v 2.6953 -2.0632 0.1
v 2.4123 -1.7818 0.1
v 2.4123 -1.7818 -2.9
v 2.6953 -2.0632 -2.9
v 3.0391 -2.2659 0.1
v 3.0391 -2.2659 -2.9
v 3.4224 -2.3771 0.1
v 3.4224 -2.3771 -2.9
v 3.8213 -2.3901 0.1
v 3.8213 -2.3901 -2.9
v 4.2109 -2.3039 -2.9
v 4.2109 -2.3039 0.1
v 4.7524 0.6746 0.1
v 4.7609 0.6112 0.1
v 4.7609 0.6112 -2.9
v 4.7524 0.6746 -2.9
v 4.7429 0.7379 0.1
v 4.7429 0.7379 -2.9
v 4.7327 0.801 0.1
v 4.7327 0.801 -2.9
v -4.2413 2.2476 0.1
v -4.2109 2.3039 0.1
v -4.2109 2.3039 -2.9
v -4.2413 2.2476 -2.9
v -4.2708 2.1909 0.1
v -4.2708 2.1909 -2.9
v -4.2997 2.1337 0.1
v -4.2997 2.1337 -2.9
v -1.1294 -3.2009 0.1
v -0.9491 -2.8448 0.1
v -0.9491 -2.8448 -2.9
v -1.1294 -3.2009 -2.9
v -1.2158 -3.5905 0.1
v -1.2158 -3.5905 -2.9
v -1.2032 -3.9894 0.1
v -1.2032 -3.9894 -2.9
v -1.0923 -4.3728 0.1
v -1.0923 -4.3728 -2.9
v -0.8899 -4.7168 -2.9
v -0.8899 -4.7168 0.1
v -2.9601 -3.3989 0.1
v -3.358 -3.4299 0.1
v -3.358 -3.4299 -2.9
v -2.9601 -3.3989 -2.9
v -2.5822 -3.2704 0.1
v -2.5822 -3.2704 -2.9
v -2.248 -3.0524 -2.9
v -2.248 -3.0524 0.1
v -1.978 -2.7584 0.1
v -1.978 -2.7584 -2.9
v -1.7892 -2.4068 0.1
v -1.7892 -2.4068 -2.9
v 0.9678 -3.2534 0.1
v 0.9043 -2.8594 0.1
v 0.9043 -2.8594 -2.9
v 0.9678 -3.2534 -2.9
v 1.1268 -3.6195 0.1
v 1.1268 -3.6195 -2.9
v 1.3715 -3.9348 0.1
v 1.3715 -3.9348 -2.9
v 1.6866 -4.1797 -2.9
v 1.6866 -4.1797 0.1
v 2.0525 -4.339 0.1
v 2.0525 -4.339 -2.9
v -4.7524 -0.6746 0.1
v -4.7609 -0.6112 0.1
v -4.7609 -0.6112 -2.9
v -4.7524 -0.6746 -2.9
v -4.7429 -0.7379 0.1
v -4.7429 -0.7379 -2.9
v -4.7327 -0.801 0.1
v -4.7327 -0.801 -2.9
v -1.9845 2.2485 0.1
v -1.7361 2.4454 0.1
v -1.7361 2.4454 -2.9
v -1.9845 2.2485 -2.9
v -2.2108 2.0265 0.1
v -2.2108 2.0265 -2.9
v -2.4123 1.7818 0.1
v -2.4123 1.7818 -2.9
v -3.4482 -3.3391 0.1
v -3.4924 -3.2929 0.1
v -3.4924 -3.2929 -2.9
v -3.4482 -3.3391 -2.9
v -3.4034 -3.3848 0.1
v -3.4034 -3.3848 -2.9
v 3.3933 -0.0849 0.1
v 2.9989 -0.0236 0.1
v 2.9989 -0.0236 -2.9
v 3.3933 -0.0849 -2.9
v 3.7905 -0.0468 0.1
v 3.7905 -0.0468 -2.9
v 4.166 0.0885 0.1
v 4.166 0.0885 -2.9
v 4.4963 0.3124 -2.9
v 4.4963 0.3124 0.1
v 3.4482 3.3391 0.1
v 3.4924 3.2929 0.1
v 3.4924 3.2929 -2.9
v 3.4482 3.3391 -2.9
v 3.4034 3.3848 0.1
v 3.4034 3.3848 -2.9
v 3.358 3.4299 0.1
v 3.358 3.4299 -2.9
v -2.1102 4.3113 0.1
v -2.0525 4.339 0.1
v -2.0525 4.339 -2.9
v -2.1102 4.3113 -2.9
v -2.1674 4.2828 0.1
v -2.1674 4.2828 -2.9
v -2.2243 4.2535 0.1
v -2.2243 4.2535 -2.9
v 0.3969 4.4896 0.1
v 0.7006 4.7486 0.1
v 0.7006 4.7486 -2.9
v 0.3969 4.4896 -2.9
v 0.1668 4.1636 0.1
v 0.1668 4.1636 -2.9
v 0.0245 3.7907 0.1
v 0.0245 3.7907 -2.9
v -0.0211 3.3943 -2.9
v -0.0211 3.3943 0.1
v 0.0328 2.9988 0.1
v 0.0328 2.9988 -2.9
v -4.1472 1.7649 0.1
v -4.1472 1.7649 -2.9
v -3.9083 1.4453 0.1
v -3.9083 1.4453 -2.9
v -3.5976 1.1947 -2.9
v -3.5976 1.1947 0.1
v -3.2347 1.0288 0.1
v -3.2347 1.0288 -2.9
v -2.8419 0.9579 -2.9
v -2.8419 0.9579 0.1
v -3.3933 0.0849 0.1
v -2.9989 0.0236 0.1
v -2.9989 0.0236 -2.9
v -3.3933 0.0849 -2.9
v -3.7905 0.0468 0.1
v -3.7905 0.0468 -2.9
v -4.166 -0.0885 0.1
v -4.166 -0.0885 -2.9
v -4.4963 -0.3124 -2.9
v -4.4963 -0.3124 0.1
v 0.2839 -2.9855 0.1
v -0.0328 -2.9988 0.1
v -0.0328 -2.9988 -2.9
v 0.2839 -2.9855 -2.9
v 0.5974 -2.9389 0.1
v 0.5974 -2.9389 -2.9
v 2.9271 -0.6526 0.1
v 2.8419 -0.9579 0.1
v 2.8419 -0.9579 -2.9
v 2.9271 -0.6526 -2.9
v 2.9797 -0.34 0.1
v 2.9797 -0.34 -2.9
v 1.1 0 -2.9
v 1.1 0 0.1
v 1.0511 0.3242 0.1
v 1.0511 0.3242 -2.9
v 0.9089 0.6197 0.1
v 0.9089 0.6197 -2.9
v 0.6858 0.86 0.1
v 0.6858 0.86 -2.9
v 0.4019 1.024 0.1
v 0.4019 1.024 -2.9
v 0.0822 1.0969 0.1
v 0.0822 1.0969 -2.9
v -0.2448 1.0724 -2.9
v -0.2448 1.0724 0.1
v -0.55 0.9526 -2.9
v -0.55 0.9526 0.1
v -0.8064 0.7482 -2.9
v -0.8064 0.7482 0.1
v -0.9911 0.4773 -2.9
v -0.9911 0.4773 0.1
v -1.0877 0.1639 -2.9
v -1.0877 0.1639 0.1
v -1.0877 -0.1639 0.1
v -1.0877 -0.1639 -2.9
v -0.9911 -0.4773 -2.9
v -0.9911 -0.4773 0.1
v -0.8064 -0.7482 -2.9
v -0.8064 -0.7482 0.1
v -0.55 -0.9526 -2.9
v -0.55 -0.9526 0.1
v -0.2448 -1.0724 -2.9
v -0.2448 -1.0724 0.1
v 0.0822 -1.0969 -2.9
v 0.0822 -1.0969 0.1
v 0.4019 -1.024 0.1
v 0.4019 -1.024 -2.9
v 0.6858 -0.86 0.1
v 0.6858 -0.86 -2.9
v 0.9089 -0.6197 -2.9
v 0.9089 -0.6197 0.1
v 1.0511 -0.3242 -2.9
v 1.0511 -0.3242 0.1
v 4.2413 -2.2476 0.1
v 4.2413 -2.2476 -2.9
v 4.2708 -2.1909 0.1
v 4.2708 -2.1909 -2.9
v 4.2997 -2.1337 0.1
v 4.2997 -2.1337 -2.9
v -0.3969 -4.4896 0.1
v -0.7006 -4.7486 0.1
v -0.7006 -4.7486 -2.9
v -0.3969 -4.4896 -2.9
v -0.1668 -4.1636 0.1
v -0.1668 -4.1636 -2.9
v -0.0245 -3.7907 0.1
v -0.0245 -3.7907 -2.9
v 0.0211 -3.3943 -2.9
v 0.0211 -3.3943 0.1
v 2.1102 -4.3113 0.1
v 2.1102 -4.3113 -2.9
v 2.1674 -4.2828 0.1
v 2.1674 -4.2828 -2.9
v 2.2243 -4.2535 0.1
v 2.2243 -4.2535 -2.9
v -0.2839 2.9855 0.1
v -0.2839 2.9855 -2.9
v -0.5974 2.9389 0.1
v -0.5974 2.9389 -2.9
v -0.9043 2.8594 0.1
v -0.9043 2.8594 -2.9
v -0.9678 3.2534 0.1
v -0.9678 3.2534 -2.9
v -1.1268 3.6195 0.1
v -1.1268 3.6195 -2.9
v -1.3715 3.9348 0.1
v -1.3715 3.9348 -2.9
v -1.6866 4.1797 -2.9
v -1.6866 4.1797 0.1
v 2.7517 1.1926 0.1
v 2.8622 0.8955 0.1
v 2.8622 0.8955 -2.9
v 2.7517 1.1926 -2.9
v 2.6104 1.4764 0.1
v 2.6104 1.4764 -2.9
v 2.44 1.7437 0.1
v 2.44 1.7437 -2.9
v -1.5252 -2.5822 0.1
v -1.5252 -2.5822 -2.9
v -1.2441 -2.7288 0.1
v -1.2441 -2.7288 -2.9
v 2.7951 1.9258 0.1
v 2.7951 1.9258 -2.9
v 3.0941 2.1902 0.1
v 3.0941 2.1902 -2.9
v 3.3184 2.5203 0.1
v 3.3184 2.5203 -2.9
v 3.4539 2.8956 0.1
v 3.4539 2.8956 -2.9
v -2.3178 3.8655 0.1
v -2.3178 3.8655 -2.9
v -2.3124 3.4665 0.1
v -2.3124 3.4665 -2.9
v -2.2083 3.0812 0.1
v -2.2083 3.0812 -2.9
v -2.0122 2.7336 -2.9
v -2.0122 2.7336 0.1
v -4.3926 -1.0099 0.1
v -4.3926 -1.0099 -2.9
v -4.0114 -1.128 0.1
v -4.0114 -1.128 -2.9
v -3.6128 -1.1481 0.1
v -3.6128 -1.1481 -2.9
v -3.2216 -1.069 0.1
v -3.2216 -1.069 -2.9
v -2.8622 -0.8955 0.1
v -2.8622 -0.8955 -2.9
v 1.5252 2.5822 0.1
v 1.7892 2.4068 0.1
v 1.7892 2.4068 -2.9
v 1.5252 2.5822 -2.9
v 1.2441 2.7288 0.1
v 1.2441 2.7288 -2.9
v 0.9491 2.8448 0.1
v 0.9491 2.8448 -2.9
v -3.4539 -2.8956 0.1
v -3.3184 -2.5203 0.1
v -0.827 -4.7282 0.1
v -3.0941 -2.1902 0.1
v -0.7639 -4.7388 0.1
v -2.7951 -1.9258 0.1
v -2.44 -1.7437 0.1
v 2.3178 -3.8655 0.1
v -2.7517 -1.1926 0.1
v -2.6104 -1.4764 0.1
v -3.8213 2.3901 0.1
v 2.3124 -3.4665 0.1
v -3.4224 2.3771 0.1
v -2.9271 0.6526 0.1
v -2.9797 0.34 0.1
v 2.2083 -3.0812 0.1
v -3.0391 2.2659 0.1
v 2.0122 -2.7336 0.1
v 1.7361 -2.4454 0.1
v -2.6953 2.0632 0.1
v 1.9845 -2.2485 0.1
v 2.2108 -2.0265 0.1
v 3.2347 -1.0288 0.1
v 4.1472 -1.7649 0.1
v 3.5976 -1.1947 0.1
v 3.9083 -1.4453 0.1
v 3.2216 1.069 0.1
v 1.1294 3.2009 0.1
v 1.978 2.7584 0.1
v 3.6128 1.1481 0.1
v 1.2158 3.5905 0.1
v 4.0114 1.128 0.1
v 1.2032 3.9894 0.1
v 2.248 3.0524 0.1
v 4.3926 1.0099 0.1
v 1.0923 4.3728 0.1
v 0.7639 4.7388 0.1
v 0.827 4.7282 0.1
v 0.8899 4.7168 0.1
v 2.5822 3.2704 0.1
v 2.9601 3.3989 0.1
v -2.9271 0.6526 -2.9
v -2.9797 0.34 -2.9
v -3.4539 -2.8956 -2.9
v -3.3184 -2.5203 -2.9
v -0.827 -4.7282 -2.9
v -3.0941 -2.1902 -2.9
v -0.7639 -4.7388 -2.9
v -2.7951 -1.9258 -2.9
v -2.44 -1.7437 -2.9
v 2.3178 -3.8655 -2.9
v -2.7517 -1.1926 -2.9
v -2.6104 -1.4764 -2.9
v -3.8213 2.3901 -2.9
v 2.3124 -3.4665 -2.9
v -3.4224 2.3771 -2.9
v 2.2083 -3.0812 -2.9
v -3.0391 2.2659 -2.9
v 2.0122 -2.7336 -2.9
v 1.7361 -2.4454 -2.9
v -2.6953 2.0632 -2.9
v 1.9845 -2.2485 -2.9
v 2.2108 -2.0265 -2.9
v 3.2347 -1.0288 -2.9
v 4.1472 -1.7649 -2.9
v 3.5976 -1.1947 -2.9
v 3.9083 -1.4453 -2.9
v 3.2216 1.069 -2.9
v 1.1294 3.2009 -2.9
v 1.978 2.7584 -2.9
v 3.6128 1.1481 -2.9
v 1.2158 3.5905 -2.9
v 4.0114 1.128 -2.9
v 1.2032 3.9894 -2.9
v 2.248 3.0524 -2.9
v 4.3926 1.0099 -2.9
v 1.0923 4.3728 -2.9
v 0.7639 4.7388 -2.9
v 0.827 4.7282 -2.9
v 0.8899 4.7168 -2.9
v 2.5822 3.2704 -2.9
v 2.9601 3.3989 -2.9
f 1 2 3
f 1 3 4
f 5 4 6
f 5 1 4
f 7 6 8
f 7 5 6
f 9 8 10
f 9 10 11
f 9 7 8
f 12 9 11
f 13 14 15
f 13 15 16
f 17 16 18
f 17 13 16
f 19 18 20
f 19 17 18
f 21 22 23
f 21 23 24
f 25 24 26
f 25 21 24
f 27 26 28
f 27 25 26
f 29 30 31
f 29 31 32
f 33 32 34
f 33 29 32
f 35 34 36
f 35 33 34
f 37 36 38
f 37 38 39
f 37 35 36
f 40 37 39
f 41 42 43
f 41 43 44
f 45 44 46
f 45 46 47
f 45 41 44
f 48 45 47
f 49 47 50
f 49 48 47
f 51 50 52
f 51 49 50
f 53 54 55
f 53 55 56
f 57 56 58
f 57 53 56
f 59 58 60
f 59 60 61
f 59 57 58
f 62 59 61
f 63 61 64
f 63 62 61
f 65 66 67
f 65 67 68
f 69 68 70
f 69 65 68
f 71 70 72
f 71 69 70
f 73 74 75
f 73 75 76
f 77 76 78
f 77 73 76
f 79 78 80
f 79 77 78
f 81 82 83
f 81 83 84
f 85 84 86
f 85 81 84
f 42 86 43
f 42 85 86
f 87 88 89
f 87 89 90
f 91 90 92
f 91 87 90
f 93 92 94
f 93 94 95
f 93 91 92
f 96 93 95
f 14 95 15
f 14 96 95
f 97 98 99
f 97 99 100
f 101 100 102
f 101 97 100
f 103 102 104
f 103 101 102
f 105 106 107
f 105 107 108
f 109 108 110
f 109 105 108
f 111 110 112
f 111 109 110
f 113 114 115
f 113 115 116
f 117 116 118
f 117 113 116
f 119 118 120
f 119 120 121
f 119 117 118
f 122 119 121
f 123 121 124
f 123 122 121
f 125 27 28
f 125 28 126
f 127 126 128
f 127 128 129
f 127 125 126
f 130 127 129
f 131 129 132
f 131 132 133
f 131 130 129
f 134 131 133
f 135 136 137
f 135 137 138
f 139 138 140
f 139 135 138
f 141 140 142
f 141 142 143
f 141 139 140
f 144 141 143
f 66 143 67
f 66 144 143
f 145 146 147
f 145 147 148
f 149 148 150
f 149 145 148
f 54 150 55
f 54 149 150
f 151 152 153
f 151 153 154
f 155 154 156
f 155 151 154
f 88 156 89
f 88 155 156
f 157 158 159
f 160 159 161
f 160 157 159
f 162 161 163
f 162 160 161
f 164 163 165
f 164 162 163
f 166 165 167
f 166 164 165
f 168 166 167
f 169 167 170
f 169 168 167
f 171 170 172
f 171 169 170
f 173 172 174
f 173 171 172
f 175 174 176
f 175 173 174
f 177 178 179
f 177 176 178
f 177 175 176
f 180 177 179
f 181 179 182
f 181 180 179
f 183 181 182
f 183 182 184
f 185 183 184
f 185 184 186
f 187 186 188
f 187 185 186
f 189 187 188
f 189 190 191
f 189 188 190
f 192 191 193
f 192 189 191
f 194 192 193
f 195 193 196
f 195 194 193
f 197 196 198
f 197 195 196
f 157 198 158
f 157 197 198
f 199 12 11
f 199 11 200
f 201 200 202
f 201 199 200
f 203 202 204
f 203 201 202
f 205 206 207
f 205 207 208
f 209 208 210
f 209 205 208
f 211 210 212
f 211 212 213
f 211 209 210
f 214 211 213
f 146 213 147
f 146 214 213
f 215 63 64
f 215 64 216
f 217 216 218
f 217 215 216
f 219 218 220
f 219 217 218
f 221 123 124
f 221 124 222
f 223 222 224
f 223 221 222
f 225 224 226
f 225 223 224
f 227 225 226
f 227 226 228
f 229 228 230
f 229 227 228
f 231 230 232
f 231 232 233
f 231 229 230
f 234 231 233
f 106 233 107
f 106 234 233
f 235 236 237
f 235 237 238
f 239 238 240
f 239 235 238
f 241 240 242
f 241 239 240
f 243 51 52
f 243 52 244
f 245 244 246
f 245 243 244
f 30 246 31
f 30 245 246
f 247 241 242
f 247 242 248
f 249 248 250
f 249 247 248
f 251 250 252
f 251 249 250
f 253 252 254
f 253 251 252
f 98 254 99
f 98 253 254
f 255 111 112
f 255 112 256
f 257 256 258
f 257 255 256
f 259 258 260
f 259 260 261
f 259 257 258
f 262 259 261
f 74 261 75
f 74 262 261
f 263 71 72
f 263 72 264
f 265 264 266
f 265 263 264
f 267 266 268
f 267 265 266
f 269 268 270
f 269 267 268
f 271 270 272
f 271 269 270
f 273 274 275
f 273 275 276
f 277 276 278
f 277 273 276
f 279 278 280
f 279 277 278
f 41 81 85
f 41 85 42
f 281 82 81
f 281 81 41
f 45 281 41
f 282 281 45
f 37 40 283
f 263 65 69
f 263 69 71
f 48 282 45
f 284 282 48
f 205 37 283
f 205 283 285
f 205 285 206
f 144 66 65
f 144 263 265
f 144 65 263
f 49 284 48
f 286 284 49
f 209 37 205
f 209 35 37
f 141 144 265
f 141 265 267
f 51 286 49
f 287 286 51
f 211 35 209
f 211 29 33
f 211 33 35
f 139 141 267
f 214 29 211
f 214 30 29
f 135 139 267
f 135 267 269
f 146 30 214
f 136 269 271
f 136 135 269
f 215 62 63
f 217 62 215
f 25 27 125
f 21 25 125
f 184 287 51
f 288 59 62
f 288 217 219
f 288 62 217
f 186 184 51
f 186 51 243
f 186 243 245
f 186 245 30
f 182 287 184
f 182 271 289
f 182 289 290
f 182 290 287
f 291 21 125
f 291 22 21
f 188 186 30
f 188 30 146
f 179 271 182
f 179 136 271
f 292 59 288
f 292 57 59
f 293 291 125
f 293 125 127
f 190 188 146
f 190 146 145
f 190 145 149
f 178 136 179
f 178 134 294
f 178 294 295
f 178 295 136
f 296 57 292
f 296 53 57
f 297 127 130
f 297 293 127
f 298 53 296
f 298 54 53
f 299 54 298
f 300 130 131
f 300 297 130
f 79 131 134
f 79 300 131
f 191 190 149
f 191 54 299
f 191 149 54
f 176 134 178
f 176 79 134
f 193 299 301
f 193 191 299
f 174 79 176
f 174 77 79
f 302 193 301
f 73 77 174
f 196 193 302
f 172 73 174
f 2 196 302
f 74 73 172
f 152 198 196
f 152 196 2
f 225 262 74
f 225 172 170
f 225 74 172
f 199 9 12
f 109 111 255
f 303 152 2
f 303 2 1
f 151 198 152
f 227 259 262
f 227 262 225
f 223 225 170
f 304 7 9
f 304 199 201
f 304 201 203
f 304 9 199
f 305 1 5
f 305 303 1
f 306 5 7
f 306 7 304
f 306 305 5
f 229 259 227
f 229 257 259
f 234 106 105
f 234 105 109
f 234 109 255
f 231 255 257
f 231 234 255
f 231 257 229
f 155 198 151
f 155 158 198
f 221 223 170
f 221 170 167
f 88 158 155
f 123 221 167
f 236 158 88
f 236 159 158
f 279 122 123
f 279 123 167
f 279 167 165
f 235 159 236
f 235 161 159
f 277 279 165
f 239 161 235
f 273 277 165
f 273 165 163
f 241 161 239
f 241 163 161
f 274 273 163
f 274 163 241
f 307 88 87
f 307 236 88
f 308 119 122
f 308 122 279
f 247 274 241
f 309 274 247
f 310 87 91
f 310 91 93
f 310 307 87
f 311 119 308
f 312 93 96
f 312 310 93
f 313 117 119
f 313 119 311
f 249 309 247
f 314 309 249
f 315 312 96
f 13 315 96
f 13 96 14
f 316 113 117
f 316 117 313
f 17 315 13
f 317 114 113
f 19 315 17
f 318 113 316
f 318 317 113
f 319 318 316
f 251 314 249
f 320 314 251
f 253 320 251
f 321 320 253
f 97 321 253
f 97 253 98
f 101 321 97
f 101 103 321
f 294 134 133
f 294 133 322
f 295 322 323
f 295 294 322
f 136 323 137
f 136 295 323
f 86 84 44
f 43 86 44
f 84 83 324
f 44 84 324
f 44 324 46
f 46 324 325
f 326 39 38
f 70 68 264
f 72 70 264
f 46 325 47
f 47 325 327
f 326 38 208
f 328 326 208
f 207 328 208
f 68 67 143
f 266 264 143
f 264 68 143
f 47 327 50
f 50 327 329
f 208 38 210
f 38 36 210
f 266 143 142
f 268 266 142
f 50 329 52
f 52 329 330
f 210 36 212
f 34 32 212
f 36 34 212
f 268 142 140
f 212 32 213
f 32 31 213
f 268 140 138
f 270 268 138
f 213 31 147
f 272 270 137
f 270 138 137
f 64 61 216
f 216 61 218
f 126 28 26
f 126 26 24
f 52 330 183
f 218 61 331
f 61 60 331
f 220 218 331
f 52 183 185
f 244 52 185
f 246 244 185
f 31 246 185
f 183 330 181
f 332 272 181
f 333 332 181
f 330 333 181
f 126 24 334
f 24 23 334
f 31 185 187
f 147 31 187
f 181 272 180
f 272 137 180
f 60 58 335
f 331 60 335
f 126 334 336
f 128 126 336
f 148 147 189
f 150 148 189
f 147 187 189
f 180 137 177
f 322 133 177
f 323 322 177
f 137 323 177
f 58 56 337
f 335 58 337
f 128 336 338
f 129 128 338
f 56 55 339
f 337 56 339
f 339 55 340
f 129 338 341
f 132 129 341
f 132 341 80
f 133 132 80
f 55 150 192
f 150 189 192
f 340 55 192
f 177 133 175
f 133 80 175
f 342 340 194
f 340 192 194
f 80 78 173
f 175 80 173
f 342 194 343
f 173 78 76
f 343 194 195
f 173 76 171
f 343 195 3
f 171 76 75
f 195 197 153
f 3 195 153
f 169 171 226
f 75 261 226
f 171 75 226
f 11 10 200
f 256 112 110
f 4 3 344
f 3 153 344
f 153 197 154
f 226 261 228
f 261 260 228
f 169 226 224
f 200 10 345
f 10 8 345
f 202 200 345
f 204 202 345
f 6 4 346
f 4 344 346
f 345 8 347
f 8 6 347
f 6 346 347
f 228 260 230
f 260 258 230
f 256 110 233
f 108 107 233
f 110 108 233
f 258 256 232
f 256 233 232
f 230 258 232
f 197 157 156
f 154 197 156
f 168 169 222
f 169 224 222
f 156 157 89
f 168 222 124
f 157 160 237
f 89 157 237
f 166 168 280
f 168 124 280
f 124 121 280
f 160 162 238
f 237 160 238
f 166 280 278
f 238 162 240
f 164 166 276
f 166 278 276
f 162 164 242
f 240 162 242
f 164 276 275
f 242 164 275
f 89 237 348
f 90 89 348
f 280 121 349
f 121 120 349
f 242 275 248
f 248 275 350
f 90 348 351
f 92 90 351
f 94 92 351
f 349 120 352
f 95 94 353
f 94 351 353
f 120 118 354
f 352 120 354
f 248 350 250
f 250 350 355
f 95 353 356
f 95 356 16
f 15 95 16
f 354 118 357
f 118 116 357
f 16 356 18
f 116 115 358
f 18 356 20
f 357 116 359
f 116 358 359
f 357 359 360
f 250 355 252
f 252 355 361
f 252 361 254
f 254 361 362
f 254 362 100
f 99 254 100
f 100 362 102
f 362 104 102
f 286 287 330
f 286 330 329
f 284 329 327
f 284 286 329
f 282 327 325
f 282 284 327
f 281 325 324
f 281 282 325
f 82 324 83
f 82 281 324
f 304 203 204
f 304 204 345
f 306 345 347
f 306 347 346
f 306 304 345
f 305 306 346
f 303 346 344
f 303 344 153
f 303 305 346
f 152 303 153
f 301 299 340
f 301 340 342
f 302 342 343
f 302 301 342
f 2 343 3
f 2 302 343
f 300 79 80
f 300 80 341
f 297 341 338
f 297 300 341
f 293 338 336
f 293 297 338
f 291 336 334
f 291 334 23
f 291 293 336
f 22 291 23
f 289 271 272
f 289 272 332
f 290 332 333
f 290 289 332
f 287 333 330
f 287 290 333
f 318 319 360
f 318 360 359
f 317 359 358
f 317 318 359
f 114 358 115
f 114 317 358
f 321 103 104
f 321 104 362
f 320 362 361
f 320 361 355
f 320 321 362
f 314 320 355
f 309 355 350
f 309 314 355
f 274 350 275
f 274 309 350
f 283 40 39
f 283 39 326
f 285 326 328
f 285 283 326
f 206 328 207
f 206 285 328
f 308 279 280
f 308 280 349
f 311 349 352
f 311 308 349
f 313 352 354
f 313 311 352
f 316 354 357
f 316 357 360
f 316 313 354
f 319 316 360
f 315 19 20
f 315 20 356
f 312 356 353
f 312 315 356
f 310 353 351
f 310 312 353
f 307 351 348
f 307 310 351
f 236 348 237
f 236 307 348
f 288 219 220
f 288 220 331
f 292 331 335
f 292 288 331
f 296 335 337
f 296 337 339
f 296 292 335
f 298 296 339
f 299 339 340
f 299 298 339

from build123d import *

# Parameters (mm, degrees)
SKETCH1_R           = 6
SKETCH1_R_2         = 1.1
BOSS_EXTRUDE1_DEPTH = 2.9
SKETCH2_R           = 6
CUT_EXTRUDE1_DEPTH  = 11.278132126
CUT_EXTRUDE2_DEPTH  = 2.8


with BuildPart() as part:
    # Sketch1 → Boss-Extrude1 (new, symmetric)
    with BuildSketch(Plane.XY):
        Circle(SKETCH1_R)
        Circle(SKETCH1_R_2, mode=Mode.SUBTRACT)
    extrude(amount=BOSS_EXTRUDE1_DEPTH, both=True)

    # Sketch2 → Cut-Extrude1 (cut, through all)
    with BuildSketch(Plane.XY.offset(2.9)):
        Circle(SKETCH2_R)
        with BuildLine():
            ThreePointArc((-0.904303163, 2.859411966), (-1.23929318, 3.784776039), (-2.052505646, 4.339034521))
            ThreePointArc((-2.052505646, 4.339034521), (-2.138842368, 4.297133152), (-2.224324134, 4.253514094))
            ThreePointArc((-2.224324134, 4.253514094), (-2.272407373, 3.270556831), (-1.736096974, 2.44539737))
            ThreePointArc((-1.736096974, 2.44539737), (-2.100579038, 2.140459929), (-2.412316811, 1.781776811))
            ThreePointArc((-2.412316811, 1.781776811), (-3.227244783, 2.333509881), (-4.210932449, 2.303920118))
            ThreePointArc((-4.210932449, 2.303920118), (-4.256151318, 2.219273746), (-4.29966888, 2.133740266))
            ThreePointArc((-4.29966888, 2.133740266), (-3.760801254, 1.310248516), (-2.841900466, 0.957915832))
            ThreePointArc((-2.841900466, 0.957915832), (-2.957534919, 0.496979078), (-2.998907428, 0.023563475))
            ThreePointArc((-2.998907428, 0.023563475), (-3.982498568, -0.009077739), (-4.760926181, -0.611213463))
            ThreePointArc((-4.760926181, -0.611213463), (-4.747755125, -0.706272801), (-4.732686255, -0.801049821))
            ThreePointArc((-4.732686255, -0.801049821), (-3.812696882, -1.150530198), (-2.862194572, -0.895456995))
            ThreePointArc((-2.862194572, -0.895456995), (-2.684812984, -1.336330888), (-2.440017337, -1.743650307))
            ThreePointArc((-2.440017337, -1.743650307), (-3.216573261, -2.348197971), (-3.49240793, -3.292884275))
            ThreePointArc((-3.49240793, -3.292884275), (-3.425877845, -3.362047143), (-3.357978338, -3.429866103))
            ThreePointArc((-3.357978338, -3.429866103), (-2.408271889, -3.171845481), (-1.789227635, -2.406795685))
            ThreePointArc((-1.789227635, -2.406795685), (-1.386583742, -2.659207876), (-0.949123556, -2.844848937))
            ThreePointArc((-0.949123556, -2.844848937), (-1.222026295, -3.79038639), (-0.889908552, -4.716785215))
            ThreePointArc((-0.889908552, -4.716785215), (-0.795431669, -4.733633748), (-0.700636829, -4.74859011))
            ThreePointArc((-0.700636829, -4.74859011), (-0.083968889, -3.981623598), (-0.032836554, -2.998820228))
            ThreePointArc((-0.032836554, -2.998820228), (0.44127336, -2.966357838), (0.904303163, -2.859411966))
            ThreePointArc((0.904303163, -2.859411966), (1.23929318, -3.784776039), (2.052505646, -4.339034521))
            ThreePointArc((2.052505646, -4.339034521), (2.138842368, -4.297133152), (2.224324134, -4.253514094))
            ThreePointArc((2.224324134, -4.253514094), (2.272407373, -3.270556831), (1.736096974, -2.44539737))
            ThreePointArc((1.736096974, -2.44539737), (2.100579038, -2.140459929), (2.412316811, -1.781776811))
            ThreePointArc((2.412316811, -1.781776811), (3.227244783, -2.333509881), (4.210932449, -2.303920118))
            ThreePointArc((4.210932449, -2.303920118), (4.256151318, -2.219273746), (4.29966888, -2.133740266))
            ThreePointArc((4.29966888, -2.133740266), (3.760801254, -1.310248516), (2.841900466, -0.957915832))
            ThreePointArc((2.841900466, -0.957915832), (2.957534919, -0.496979078), (2.998907428, -0.023563475))
            ThreePointArc((2.998907428, -0.023563475), (3.982498568, 0.009077739), (4.760926181, 0.611213463))
            ThreePointArc((4.760926181, 0.611213463), (4.747755125, 0.706272801), (4.732686255, 0.801049821))
            ThreePointArc((4.732686255, 0.801049821), (3.812696882, 1.150530198), (2.862194572, 0.895456995))
            ThreePointArc((2.862194572, 0.895456995), (2.684812984, 1.336330888), (2.440017337, 1.743650307))
            ThreePointArc((2.440017337, 1.743650307), (3.216573261, 2.348197971), (3.49240793, 3.292884275))
            ThreePointArc((3.49240793, 3.292884275), (3.425877845, 3.362047143), (3.357978338, 3.429866103))
            ThreePointArc((3.357978338, 3.429866103), (2.408271889, 3.171845481), (1.789227635, 2.406795685))
            ThreePointArc((1.789227635, 2.406795685), (1.386583742, 2.659207876), (0.949123556, 2.844848937))
            ThreePointArc((0.949123556, 2.844848937), (1.222026295, 3.79038639), (0.889908552, 4.716785215))
            ThreePointArc((0.889908552, 4.716785215), (0.795431669, 4.733633748), (0.700636829, 4.74859011))
            ThreePointArc((0.700636829, 4.74859011), (0.083968889, 3.981623598), (0.032836554, 2.998820228))
            ThreePointArc((0.032836554, 2.998820228), (-0.44127336, 2.966357838), (-0.904303163, 2.859411966))
        make_face(mode=Mode.SUBTRACT)
    extrude(amount=-CUT_EXTRUDE1_DEPTH, mode=Mode.SUBTRACT)

    # Sketch3 → Cut-Extrude2 (cut)
    with BuildSketch(Plane.XY.offset(2.9)):
        with BuildLine():
            ThreePointArc((0.700636829, 4.74859011), (0.083968889, 3.981623598), (0.032836554, 2.998820228))
            ThreePointArc((0.032836554, 2.998820228), (-0.44127336, 2.966357838), (-0.904303163, 2.859411966))
            ThreePointArc((-0.904303163, 2.859411966), (-1.23929318, 3.784776039), (-2.052505646, 4.339034521))
            ThreePointArc((-2.052505646, 4.339034521), (-2.138842368, 4.297133152), (-2.224324134, 4.253514094))
            ThreePointArc((-2.224324134, 4.253514094), (-2.272407373, 3.270556831), (-1.736096974, 2.44539737))
            ThreePointArc((-1.736096974, 2.44539737), (-2.100579038, 2.140459929), (-2.412316811, 1.781776811))
            ThreePointArc((-2.412316811, 1.781776811), (-3.227244783, 2.333509881), (-4.210932449, 2.303920118))
            ThreePointArc((-4.210932449, 2.303920118), (-4.256151318, 2.219273746), (-4.29966888, 2.133740266))
            ThreePointArc((-4.29966888, 2.133740266), (-3.760801254, 1.310248516), (-2.841900466, 0.957915832))
            ThreePointArc((-2.841900466, 0.957915832), (-2.957534919, 0.496979078), (-2.998907428, 0.023563475))
            ThreePointArc((-2.998907428, 0.023563475), (-3.982498568, -0.009077739), (-4.760926181, -0.611213463))
            ThreePointArc((-4.760926181, -0.611213463), (-4.747755125, -0.706272801), (-4.732686255, -0.801049821))
            ThreePointArc((-4.732686255, -0.801049821), (-3.812696882, -1.150530198), (-2.862194572, -0.895456995))
            ThreePointArc((-2.862194572, -0.895456995), (-2.684812984, -1.336330888), (-2.440017337, -1.743650307))
            ThreePointArc((-2.440017337, -1.743650307), (-3.216573261, -2.348197971), (-3.49240793, -3.292884275))
            ThreePointArc((-3.49240793, -3.292884275), (-3.425877845, -3.362047143), (-3.357978338, -3.429866103))
            ThreePointArc((-3.357978338, -3.429866103), (-2.408271889, -3.171845481), (-1.789227635, -2.406795685))
            ThreePointArc((-1.789227635, -2.406795685), (-1.386583742, -2.659207876), (-0.949123556, -2.844848937))
            ThreePointArc((-0.949123556, -2.844848937), (-1.222026295, -3.79038639), (-0.889908552, -4.716785215))
            ThreePointArc((-0.889908552, -4.716785215), (-0.795431669, -4.733633748), (-0.700636829, -4.74859011))
            ThreePointArc((-0.700636829, -4.74859011), (-0.083968889, -3.981623598), (-0.032836554, -2.998820228))
            ThreePointArc((-0.032836554, -2.998820228), (0.44127336, -2.966357838), (0.904303163, -2.859411966))
            ThreePointArc((0.904303163, -2.859411966), (1.23929318, -3.784776039), (2.052505646, -4.339034521))
            ThreePointArc((2.052505646, -4.339034521), (2.138842368, -4.297133152), (2.224324134, -4.253514094))
            ThreePointArc((2.224324134, -4.253514094), (2.272407373, -3.270556831), (1.736096974, -2.44539737))
            ThreePointArc((1.736096974, -2.44539737), (2.100579038, -2.140459929), (2.412316811, -1.781776811))
            ThreePointArc((2.412316811, -1.781776811), (3.227244783, -2.333509881), (4.210932449, -2.303920118))
            ThreePointArc((4.210932449, -2.303920118), (4.256151318, -2.219273746), (4.29966888, -2.133740266))
            ThreePointArc((4.29966888, -2.133740266), (3.760801254, -1.310248516), (2.841900466, -0.957915832))
            ThreePointArc((2.841900466, -0.957915832), (2.957534919, -0.496979078), (2.998907428, -0.023563475))
            ThreePointArc((2.998907428, -0.023563475), (3.982498568, 0.009077739), (4.760926181, 0.611213463))
            ThreePointArc((4.760926181, 0.611213463), (4.747755125, 0.706272801), (4.732686255, 0.801049821))
            ThreePointArc((4.732686255, 0.801049821), (3.812696882, 1.150530198), (2.862194572, 0.895456995))
            ThreePointArc((2.862194572, 0.895456995), (2.684812984, 1.336330888), (2.440017337, 1.743650307))
            ThreePointArc((2.440017337, 1.743650307), (3.216573261, 2.348197971), (3.49240793, 3.292884275))
            ThreePointArc((3.49240793, 3.292884275), (3.425877845, 3.362047143), (3.357978338, 3.429866103))
            ThreePointArc((3.357978338, 3.429866103), (2.408271889, 3.171845481), (1.789227635, 2.406795685))
            ThreePointArc((1.789227635, 2.406795685), (1.386583742, 2.659207876), (0.949123556, 2.844848937))
            ThreePointArc((0.949123556, 2.844848937), (1.222026295, 3.79038639), (0.889908552, 4.716785215))
            ThreePointArc((0.889908552, 4.716785215), (0.795431669, 4.733633748), (0.700636829, 4.74859011))
        make_face()
    extrude(amount=-CUT_EXTRUDE2_DEPTH, mode=Mode.SUBTRACT)


solid = part.part
